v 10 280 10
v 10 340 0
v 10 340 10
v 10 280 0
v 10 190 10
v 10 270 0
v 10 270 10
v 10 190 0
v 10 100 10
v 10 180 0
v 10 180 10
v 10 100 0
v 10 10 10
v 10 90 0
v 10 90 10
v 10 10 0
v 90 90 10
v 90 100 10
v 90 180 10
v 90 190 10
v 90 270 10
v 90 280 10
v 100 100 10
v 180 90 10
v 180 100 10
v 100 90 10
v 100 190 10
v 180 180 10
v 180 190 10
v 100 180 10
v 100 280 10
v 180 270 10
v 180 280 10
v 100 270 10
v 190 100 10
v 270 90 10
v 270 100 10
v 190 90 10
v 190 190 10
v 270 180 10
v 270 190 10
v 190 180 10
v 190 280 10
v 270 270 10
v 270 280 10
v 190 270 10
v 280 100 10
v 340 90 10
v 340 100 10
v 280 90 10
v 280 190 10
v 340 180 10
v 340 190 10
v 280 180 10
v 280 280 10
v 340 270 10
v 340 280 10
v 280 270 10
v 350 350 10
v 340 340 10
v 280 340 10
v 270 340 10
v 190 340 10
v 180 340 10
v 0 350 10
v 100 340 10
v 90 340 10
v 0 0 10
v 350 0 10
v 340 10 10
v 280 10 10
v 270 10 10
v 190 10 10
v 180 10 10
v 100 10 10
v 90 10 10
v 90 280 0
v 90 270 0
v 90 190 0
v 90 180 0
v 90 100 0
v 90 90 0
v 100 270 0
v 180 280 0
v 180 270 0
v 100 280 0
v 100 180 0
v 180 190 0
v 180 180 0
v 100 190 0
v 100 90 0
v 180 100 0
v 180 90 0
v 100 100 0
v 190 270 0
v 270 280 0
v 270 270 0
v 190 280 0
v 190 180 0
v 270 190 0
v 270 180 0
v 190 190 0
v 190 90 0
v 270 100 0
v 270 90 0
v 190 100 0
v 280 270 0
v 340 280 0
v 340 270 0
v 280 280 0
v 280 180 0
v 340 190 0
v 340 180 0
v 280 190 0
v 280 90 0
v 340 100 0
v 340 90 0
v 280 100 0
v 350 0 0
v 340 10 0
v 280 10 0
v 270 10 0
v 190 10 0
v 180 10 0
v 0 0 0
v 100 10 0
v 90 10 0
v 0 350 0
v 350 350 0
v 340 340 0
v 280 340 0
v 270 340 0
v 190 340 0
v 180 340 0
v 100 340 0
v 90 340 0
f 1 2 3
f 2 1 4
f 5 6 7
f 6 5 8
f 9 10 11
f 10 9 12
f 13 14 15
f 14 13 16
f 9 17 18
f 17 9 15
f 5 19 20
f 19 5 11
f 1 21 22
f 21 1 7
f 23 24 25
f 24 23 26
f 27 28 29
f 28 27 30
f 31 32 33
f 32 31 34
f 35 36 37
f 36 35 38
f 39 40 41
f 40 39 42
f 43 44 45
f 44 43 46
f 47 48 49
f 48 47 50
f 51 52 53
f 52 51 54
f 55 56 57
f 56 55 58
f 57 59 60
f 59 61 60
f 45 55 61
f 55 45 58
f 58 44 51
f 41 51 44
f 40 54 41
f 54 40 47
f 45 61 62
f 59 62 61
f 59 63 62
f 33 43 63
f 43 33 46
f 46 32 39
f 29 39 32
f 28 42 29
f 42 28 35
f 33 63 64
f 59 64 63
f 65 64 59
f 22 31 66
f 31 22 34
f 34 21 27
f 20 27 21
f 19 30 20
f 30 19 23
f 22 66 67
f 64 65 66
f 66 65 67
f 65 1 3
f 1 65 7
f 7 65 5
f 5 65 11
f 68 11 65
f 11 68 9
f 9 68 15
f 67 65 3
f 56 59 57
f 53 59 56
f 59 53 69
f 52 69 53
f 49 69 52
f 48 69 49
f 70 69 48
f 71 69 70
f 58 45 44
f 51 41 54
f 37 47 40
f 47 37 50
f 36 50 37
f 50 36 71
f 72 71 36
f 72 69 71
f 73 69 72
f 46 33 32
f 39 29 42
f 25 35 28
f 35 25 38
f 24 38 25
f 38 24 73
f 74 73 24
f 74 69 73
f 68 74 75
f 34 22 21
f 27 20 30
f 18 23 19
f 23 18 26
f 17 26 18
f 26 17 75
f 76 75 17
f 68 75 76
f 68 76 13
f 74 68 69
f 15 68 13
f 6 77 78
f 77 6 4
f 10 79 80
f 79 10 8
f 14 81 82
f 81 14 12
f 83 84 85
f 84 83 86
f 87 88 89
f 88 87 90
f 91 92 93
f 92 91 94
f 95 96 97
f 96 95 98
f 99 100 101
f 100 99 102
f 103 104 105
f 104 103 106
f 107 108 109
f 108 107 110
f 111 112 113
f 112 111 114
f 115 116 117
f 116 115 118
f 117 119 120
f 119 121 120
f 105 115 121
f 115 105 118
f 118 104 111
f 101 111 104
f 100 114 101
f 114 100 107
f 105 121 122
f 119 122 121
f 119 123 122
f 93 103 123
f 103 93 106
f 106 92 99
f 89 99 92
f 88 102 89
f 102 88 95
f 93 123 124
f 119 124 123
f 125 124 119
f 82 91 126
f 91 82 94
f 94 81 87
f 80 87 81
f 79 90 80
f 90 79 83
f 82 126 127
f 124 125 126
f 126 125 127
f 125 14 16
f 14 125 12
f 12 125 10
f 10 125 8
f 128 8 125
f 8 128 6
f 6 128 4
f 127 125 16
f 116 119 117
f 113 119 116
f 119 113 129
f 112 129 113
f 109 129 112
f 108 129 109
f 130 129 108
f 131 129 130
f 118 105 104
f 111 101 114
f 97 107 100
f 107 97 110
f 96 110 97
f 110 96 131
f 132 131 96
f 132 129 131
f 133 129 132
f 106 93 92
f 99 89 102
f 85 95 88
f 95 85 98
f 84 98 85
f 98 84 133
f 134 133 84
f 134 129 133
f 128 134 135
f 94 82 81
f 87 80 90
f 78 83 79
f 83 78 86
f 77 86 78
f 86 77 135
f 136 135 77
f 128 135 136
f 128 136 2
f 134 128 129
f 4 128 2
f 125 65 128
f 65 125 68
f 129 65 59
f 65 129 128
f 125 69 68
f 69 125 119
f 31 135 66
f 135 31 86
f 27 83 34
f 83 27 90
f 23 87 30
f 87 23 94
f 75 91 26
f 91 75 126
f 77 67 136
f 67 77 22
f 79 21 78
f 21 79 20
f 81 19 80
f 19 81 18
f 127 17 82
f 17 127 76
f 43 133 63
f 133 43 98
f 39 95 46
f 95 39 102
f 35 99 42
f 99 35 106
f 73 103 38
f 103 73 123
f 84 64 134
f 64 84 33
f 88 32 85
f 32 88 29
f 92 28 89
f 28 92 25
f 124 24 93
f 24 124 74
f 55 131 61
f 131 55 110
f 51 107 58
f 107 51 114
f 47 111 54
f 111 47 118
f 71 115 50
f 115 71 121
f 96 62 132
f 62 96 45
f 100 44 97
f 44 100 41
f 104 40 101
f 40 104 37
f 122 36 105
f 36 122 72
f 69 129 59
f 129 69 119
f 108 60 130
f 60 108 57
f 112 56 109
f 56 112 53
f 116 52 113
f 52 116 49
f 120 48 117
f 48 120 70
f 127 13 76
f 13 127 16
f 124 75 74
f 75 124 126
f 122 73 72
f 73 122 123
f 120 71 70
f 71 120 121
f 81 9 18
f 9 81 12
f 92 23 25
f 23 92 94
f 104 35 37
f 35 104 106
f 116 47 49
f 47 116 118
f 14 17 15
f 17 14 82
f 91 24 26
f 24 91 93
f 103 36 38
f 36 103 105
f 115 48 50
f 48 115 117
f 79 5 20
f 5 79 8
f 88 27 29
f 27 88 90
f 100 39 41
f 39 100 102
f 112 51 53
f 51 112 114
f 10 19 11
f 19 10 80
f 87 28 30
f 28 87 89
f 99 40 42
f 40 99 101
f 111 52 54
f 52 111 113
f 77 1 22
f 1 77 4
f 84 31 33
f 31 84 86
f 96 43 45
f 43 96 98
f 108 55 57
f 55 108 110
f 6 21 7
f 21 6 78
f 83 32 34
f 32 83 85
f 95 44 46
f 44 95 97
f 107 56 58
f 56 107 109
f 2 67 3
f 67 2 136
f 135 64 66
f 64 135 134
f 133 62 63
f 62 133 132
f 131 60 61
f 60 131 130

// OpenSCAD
union() {
    for (x = [0, 90, 180, 270, 340]) {
        translate([x, 0, 0])
            cube([10, 350, 10]);
    }
    for (y = [0, 90, 180, 270, 340]) {
        translate([0, y, 0])
            cube([350, 10, 10]);
    }
}
